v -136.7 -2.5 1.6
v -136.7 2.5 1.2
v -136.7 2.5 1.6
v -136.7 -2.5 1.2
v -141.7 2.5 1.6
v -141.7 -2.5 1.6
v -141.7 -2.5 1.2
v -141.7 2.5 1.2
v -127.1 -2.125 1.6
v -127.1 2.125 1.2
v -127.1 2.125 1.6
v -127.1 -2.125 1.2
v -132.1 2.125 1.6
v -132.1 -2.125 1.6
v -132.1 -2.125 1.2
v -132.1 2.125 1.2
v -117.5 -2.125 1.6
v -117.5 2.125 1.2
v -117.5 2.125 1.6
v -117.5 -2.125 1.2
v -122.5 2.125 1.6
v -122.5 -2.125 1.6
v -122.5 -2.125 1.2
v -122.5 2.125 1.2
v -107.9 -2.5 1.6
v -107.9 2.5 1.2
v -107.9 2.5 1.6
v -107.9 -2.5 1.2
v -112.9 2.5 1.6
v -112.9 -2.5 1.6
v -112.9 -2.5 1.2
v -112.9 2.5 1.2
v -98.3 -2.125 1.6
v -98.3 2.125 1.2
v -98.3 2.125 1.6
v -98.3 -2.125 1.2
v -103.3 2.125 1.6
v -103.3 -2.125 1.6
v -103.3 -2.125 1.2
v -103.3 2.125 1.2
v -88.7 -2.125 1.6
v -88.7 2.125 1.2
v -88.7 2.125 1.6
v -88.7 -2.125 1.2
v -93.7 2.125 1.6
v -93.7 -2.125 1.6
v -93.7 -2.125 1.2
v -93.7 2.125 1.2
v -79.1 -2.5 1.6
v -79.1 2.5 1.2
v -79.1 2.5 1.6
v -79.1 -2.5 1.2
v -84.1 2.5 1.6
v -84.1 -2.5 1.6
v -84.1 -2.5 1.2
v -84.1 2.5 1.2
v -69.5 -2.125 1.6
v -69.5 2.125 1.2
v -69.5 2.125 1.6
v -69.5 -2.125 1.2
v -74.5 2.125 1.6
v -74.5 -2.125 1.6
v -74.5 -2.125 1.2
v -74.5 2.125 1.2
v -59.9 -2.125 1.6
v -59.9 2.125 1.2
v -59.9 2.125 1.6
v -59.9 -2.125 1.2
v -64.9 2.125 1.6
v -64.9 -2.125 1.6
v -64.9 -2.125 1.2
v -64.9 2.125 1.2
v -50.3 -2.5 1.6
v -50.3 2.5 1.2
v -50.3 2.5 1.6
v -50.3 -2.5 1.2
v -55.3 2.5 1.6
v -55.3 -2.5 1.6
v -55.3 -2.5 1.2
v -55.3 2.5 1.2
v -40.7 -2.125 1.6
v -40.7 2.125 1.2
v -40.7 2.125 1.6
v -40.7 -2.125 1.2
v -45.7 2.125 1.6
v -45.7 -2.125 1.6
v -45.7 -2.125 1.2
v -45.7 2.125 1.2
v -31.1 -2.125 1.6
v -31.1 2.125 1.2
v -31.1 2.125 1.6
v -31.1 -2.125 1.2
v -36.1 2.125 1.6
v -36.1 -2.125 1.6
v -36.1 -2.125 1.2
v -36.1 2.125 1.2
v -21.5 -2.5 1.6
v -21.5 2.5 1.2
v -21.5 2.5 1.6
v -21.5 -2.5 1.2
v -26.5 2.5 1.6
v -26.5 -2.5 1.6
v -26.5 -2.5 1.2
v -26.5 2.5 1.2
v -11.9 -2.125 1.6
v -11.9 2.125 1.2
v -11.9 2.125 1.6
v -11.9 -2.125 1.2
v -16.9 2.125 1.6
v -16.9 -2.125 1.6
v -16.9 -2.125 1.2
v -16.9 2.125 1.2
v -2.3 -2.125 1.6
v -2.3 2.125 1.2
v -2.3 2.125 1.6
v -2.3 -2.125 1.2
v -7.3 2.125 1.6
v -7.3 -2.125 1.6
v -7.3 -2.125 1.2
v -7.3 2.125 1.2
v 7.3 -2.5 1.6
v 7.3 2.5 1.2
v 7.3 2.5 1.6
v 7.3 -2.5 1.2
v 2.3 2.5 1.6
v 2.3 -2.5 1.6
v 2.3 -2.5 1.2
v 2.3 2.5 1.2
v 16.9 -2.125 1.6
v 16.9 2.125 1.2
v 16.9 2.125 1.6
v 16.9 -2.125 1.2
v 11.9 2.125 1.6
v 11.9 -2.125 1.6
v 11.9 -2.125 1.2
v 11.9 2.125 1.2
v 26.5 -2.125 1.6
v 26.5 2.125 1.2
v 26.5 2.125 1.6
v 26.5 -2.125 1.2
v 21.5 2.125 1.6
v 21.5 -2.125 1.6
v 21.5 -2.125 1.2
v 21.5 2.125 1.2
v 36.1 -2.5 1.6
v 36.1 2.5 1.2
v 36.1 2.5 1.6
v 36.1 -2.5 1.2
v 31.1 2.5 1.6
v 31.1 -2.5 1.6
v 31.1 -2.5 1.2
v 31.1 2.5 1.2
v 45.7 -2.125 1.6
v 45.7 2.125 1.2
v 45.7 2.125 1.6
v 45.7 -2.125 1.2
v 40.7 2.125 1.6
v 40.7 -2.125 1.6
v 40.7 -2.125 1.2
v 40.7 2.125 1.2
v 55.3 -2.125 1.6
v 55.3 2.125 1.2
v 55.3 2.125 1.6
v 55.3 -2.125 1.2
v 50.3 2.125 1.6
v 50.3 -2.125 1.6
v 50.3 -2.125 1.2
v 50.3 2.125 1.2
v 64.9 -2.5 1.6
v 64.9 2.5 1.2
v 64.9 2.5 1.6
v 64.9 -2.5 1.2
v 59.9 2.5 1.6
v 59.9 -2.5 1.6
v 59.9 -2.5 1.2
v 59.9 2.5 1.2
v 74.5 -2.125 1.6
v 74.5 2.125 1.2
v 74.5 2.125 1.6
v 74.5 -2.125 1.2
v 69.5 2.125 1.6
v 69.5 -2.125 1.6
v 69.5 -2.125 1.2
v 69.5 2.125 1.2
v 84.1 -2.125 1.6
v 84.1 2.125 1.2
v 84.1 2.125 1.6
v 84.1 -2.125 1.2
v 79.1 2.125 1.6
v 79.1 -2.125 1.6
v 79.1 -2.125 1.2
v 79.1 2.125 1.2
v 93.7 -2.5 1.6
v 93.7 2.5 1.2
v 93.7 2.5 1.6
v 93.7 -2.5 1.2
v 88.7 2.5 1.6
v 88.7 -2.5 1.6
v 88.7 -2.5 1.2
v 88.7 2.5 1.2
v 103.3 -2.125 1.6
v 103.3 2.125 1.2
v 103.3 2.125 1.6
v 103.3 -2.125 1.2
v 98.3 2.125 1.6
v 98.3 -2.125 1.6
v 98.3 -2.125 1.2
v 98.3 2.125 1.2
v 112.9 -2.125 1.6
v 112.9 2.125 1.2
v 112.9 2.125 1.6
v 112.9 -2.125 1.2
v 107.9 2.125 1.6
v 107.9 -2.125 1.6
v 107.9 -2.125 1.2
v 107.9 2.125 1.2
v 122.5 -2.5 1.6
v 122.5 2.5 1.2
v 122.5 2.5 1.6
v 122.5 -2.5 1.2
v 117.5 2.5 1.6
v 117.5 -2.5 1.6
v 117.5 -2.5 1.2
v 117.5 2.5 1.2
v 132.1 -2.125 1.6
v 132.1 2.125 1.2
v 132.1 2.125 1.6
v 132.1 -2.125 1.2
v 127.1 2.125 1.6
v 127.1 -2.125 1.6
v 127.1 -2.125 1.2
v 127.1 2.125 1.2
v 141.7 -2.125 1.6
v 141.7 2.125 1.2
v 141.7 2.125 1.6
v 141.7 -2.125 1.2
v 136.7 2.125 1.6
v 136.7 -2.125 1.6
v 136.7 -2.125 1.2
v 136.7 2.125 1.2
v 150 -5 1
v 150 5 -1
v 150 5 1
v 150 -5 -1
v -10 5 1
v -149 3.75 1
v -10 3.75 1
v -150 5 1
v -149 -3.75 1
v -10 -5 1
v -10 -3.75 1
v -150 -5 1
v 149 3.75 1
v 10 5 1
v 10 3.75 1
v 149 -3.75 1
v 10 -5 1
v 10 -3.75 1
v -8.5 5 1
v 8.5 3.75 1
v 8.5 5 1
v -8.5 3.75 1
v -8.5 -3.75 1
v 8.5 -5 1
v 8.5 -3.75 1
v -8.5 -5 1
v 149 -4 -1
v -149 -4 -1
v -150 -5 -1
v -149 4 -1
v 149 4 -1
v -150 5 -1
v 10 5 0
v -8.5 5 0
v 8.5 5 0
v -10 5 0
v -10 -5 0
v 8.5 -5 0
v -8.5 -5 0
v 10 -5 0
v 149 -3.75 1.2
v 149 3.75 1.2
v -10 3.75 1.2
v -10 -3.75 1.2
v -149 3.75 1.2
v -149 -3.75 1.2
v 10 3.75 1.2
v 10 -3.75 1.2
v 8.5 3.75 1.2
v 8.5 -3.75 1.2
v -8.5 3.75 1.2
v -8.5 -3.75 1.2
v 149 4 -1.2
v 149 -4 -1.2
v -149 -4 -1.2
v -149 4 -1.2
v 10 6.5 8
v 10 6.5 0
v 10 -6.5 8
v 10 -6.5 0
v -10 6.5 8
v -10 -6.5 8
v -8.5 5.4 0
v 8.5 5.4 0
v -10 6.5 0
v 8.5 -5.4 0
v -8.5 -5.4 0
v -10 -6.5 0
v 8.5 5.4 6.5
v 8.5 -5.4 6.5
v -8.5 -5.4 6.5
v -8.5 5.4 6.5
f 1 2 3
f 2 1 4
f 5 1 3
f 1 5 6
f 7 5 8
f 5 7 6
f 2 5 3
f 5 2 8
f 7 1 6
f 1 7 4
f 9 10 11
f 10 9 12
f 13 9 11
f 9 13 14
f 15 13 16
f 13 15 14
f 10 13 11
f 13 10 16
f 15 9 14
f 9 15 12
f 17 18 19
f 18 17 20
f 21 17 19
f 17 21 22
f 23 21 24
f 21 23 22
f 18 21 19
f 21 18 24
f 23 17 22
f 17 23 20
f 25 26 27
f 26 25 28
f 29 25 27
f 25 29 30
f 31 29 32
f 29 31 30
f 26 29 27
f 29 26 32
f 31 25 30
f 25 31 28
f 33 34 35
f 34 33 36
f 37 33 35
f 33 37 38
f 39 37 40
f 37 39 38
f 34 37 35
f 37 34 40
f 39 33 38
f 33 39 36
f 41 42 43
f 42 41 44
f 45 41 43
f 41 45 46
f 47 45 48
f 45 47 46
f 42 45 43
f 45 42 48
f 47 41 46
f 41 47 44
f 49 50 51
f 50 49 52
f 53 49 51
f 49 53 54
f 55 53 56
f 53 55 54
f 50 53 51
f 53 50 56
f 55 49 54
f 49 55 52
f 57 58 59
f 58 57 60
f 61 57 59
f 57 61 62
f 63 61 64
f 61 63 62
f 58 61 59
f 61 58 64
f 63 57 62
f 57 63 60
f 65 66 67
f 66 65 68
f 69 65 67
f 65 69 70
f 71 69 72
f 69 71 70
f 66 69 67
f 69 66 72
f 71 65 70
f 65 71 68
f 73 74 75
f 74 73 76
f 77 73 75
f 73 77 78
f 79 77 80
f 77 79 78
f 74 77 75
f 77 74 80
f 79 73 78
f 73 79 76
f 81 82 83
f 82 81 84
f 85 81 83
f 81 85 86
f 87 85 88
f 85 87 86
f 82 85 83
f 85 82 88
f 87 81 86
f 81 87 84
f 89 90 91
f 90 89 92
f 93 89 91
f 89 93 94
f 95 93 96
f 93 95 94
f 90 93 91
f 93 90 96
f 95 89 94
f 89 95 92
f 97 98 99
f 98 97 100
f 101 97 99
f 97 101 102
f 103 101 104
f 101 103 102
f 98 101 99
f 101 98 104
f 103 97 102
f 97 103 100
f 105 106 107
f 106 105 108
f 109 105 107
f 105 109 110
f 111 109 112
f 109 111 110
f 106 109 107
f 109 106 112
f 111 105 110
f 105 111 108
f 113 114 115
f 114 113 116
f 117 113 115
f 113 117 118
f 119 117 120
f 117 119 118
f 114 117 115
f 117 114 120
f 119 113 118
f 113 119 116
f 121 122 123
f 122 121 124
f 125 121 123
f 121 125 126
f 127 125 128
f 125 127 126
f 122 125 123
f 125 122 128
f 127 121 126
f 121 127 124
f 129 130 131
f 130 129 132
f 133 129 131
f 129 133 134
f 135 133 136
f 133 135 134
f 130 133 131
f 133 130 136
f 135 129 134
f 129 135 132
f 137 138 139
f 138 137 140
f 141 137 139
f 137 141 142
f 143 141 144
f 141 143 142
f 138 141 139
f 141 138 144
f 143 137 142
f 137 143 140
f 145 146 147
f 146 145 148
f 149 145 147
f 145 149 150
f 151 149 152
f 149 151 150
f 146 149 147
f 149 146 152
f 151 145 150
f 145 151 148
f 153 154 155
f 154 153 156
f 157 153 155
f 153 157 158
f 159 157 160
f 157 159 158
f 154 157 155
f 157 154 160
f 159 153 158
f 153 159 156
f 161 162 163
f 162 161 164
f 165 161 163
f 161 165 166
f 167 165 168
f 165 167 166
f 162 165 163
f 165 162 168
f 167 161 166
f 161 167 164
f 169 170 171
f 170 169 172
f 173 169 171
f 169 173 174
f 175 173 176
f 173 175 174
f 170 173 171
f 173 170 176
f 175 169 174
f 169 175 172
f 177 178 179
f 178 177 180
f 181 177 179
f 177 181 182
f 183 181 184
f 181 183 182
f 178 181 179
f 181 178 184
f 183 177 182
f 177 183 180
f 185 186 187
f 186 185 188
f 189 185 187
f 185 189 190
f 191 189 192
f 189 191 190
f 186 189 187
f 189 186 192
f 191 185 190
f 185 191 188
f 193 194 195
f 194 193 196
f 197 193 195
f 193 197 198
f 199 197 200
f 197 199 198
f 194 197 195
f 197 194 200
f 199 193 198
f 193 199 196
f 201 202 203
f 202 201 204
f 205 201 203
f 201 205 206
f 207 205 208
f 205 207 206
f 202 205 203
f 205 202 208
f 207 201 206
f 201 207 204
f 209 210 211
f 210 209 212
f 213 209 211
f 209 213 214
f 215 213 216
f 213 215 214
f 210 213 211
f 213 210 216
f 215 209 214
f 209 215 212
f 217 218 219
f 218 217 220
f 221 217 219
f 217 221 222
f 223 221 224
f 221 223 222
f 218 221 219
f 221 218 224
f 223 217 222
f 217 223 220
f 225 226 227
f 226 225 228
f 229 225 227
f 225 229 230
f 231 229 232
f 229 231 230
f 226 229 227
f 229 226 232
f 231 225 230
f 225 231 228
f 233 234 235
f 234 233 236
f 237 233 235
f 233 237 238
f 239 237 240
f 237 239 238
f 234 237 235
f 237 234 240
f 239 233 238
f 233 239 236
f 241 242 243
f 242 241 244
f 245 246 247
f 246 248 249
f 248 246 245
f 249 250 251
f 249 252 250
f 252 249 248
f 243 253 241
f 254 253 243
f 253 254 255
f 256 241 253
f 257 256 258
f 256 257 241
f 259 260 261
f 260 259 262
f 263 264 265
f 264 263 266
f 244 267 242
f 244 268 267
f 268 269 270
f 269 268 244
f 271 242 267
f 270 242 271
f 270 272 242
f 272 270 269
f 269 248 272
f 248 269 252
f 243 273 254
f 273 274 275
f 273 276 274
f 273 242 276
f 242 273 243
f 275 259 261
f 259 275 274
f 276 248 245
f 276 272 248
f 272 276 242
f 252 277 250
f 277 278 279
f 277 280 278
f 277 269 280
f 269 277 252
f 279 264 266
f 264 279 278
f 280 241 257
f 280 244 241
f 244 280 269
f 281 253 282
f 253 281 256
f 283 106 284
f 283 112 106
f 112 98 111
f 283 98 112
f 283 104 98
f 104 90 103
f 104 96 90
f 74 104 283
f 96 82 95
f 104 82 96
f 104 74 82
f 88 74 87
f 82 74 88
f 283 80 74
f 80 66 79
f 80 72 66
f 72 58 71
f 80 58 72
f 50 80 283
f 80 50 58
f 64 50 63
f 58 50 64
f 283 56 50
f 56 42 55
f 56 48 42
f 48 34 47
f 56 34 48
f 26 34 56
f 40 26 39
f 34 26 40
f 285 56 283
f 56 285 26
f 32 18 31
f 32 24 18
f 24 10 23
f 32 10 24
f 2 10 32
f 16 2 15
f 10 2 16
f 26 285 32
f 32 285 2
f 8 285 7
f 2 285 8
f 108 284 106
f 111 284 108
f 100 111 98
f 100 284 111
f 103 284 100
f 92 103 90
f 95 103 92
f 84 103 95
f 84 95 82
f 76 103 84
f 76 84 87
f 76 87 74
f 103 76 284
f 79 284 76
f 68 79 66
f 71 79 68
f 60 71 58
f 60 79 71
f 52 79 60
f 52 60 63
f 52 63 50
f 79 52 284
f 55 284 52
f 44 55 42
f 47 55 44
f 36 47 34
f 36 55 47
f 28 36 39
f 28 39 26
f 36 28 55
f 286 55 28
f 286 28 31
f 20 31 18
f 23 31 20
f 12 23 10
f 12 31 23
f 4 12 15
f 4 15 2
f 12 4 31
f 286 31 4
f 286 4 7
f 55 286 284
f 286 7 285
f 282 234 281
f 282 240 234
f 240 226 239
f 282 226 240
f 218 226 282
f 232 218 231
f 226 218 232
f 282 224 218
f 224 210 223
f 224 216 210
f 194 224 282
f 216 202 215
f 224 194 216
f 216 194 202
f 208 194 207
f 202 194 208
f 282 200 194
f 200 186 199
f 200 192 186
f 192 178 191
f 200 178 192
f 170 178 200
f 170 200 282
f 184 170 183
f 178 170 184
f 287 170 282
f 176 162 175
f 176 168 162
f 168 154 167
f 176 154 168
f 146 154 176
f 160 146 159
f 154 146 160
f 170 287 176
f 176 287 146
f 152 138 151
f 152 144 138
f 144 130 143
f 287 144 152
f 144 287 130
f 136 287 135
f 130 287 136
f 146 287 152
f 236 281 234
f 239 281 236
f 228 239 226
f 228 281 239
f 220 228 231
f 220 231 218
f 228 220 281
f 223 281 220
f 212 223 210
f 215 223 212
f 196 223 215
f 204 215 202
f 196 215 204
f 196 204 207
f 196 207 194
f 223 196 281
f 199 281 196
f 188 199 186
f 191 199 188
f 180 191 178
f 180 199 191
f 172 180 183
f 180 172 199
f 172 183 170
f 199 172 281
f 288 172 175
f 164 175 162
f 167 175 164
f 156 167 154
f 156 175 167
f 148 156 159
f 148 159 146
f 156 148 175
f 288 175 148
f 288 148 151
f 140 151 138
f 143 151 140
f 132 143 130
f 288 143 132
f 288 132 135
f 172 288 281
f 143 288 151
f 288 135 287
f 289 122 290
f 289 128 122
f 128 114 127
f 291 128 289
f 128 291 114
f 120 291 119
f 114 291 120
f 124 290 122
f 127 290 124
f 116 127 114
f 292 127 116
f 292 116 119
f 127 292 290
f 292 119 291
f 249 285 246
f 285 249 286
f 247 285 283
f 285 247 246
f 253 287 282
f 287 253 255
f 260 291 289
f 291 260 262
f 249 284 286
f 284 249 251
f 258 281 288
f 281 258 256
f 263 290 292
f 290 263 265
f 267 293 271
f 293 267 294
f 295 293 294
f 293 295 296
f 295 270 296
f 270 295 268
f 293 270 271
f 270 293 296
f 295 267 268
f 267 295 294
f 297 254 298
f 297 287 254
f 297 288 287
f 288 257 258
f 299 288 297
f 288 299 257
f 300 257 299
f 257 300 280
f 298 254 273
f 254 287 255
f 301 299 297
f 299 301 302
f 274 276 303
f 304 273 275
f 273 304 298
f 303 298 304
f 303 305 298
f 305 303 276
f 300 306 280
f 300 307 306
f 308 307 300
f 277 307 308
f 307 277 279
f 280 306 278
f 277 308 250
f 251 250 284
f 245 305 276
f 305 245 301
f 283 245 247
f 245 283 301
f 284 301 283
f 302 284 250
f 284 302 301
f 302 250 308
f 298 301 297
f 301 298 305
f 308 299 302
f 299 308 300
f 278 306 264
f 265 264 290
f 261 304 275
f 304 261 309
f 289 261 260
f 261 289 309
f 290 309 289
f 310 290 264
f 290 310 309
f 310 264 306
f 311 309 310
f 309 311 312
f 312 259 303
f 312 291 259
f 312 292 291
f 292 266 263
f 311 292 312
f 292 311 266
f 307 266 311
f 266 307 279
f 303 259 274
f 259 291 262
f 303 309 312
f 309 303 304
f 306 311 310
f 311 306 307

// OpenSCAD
// Light strip: rigid (single connected solid with visible details)
// Parameters
length_mm = 300; //[150:600:1]
width_mm = 10; //[5:20:1]
thickness_mm = 2; //[1:6:0.1]
pcb_thickness_mm = 1.2; //[0.6:2.4:0.1]
led_count = 30; //[6:120:1]
grouping = 3; //[1:6:1]
segment_count = 10; //[2:40:1]
edge_margin_mm = 6; //[3:15:1]
led_pkg_length_mm = 5; //[3:8:0.1]
led_pkg_width_mm = 5; //[3:8:0.1]
led_pkg_height_mm = 1.6; //[0.8:3.2:0.1]
pad_length_mm = 2.5; //[1.5:5:0.1]
pad_width_mm = 2.5; //[1.5:5:0.1]
pad_height_mm = 0.2; //[0.1:0.6:0.05]
pad_offset_y_mm = 3; //[2:4:0.1]
marker_thickness_mm = 0.2; //[0.1:0.6:0.05]
marker_width_mm = 0.4; //[0.2:1.2:0.05]
marker_span_y_mm = 8; //[4:16:0.5]
clip_wall_mm = 1.5; //[0.8:3:0.1]
clip_length_mm = 20; //[10:60:1]
clip_depth_mm = 8; //[4:20:0.5]
clip_clearance_mm = 0.4; //[0.2:1.2:0.05]
overlap_mm = 1; //[0.5:2:0.1]

$fn = 64;

// Helpers
function clamp(v, lo, hi) = v < lo ? lo : (v > hi ? hi : v);
function safe(v, eps=0.01) = v < eps ? eps : v;

// Derived / safety
strip_t = safe(thickness_mm);
ov      = clamp(overlap_mm, 0.2, 2);

pcb_t   = clamp(pcb_thickness_mm, 0.2, strip_t - 0.2);

led_h   = clamp(led_pkg_height_mm, 0.4, 3.5);
pad_h   = clamp(pad_height_mm, 0.05, 1.0);
mark_h  = clamp(marker_thickness_mm, 0.05, 1.0);

// Ensure details fit within strip width
led_w   = clamp(led_pkg_width_mm, 0.5, width_mm - 2*ov);
pad_w   = clamp(pad_width_mm, 0.5, width_mm/2 - 2*ov);
pad_off = clamp(pad_offset_y_mm, 0, (width_mm/2 - pad_w/2 - ov));

// Keep edge margin valid
edge_m  = clamp(edge_margin_mm, 0, length_mm/2 - 1);

// Z placement: embed slightly so union is one connected solid
z_top = strip_t/2;
z_led = z_top + led_h/2 - ov;
z_pad = z_top + pad_h/2 - ov;
z_mrk = z_top + mark_h/2 - ov;

// Clip placement: intersect strip so assembly is one connected solid
clip_z = z_top + clip_depth_mm/2 - ov;

// Diffuser ridge (adds visible top feature, fused)
diffuser_h = clamp(strip_t*0.6, 0.4, 2.5);
diffuser_w = clamp(width_mm*0.75, 2, width_mm - 2*ov);
diffuser_z = z_top + diffuser_h/2 - ov;

// Small underside stiffener rib (adds visible bottom feature, fused)
rib_h = clamp(strip_t*0.5, 0.3, 2.0);
rib_w = clamp(width_mm*0.35, 1.0, width_mm - 2*ov);
rib_z = -strip_t/2 - rib_h/2 + ov;

// LED pitch derived from count and margins
usable_len = max(1, length_mm - 2*edge_m);
led_pitch  = usable_len / led_count;

// Segment marker positions
seg_n = clamp(segment_count, 2, 200);

// Main strip with details (single solid)
module light_strip_solid() {
    union() {
        // Main rigid strip body
        cube([length_mm, width_mm, strip_t], center=true);

        // Diffuser ridge along top (visible feature)
        translate([0, 0, diffuser_z])
            cube([length_mm - 2*ov, diffuser_w, diffuser_h], center=true);

        // Underside stiffener rib
        translate([0, 0, rib_z])
            cube([length_mm - 2*ov, rib_w, rib_h], center=true);

        // PCB core embedded within strip (solid, not void)
        translate([0, 0, z_top - pcb_t/2 - ov])
            cube([length_mm - 2*ov, width_mm - 2*ov, pcb_t], center=true);

        // LED packages (grouped, raised but fused)
        for (i = [0:led_count-1]) {
            x_led = -length_mm/2 + edge_m + led_pitch*(i + 0.5);

            // Slightly vary width by grouping to show segmentation while staying connected
            w_i = clamp(led_w * ( (i % grouping)==0 ? 1.0 : 0.85 ), 0.5, width_mm - 2*ov);

            translate([x_led, 0, z_led])
                cube([led_pkg_length_mm, w_i, led_h], center=true);
        }

        // Solder pads (fused)
        for (i = [0:seg_n-1]) {
            xpad = -length_mm/2 + edge_m + usable_len*(i + 0.5)/seg_n;

            translate([xpad,  pad_off, z_pad])
                cube([pad_length_mm, pad_w, pad_h], center=true);

            translate([xpad, -pad_off, z_pad])
                cube([pad_length_mm, pad_w, pad_h], center=true);
        }

        // Segment markers (fused)
        for (i = [1:seg_n-1]) {
            xmk = -length_mm/2 + length_mm*i/seg_n;
            translate([xmk, 0, z_mrk])
                cube([marker_width_mm, clamp(marker_span_y_mm, 1, width_mm - 2*ov), mark_h], center=true);
        }
    }
}

// Clip: U-channel that wraps over strip; intersects strip so union is connected
module light_strip_clip_solid() {
    outer = [clip_length_mm, width_mm + 2*clip_wall_mm, clip_depth_mm];

    // Inner cavity: ensure positive dimensions
    inner_x = max(0.5, clip_length_mm - 2*clip_wall_mm);
    inner_y = max(0.5, width_mm + 2*clip_clearance_mm);
    inner_z = max(0.5, clip_depth_mm - clip_wall_mm); // leaves top bridge thickness = clip_wall_mm

    difference() {
        translate([0, 0, clip_z])
            cube(outer, center=true);

        // Shift cavity downward so top bridge remains; also ensure it doesn't fully remove side walls
        translate([0, 0, clip_z - clip_wall_mm/2])
            cube([inner_x, inner_y, inner_z], center=true);
    }
}

// Assembly: ONE connected solid
union() {
    light_strip_solid();
    light_strip_clip_solid();
}
